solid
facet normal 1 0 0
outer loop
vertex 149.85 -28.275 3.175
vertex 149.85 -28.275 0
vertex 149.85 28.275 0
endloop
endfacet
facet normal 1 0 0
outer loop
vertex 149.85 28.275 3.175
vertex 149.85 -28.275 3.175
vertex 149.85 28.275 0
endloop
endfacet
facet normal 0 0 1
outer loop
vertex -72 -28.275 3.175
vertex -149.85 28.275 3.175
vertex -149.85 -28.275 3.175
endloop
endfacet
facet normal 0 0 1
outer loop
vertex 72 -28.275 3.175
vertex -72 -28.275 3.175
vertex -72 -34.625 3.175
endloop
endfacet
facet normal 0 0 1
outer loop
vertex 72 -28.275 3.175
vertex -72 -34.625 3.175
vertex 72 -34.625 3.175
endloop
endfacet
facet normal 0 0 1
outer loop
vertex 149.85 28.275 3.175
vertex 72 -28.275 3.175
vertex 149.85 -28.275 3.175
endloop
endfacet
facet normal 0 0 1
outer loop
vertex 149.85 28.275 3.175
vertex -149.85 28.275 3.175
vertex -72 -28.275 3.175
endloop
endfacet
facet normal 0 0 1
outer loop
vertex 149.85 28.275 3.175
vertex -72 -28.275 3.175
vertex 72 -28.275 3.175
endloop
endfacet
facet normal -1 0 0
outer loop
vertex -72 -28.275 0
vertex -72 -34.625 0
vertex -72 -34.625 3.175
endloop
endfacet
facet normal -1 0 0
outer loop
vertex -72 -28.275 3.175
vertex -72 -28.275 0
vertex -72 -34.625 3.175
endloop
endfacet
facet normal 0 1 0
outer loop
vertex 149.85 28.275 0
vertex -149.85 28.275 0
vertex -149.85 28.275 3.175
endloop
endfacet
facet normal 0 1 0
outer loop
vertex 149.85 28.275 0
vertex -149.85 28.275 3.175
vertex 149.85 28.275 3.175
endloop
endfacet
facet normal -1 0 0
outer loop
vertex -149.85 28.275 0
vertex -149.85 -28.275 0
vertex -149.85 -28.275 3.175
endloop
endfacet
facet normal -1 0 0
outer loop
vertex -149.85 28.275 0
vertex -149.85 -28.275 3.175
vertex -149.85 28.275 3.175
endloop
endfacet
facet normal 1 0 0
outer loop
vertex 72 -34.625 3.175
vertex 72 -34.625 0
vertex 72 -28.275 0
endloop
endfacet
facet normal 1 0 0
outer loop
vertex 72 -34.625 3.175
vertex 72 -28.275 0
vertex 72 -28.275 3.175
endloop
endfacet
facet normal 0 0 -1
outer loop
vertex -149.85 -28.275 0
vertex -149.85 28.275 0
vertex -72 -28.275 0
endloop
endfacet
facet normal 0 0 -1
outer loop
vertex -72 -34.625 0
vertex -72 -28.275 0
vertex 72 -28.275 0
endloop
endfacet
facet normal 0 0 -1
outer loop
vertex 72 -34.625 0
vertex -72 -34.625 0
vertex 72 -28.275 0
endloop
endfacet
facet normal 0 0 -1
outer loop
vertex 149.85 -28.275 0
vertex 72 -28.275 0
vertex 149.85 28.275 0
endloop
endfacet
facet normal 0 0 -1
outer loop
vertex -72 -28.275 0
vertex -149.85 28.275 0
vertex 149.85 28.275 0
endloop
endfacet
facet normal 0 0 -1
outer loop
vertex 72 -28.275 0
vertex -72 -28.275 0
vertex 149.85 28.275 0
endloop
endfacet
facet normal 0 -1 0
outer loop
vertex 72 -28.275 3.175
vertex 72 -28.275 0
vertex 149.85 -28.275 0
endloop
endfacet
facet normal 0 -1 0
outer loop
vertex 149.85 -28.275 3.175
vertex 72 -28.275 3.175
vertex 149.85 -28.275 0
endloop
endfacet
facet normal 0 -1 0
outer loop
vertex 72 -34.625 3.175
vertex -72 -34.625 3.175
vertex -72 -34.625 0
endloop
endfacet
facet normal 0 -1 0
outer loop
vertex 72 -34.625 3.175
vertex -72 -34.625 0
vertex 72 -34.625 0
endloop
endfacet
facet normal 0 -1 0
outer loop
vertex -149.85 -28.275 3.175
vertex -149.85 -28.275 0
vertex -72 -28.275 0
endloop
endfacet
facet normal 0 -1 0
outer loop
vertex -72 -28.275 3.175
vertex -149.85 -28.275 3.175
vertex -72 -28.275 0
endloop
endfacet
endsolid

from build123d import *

# Parameters (mm, degrees)
SKETCH1_W           = 299.7
SKETCH1_H           = 56.55
BOSS_EXTRUDE1_DEPTH = 3.175
SKETCH2_W           = 144
SKETCH2_H           = 3.175
BOSS_EXTRUDE2_DEPTH = 6.35


with BuildPart() as part:
    # Sketch1 → Boss-Extrude1 (new body)
    with BuildSketch(Plane.XY):
        Rectangle(SKETCH1_W, SKETCH1_H)
    extrude(amount=BOSS_EXTRUDE1_DEPTH)

    # Sketch2 → Boss-Extrude2 (add)
    with BuildSketch(Plane.XZ.offset(28.275)):
        with Locations((0, 1.5875)):
            Rectangle(SKETCH2_W, SKETCH2_H)
    extrude(amount=BOSS_EXTRUDE2_DEPTH)


solid = part.part
